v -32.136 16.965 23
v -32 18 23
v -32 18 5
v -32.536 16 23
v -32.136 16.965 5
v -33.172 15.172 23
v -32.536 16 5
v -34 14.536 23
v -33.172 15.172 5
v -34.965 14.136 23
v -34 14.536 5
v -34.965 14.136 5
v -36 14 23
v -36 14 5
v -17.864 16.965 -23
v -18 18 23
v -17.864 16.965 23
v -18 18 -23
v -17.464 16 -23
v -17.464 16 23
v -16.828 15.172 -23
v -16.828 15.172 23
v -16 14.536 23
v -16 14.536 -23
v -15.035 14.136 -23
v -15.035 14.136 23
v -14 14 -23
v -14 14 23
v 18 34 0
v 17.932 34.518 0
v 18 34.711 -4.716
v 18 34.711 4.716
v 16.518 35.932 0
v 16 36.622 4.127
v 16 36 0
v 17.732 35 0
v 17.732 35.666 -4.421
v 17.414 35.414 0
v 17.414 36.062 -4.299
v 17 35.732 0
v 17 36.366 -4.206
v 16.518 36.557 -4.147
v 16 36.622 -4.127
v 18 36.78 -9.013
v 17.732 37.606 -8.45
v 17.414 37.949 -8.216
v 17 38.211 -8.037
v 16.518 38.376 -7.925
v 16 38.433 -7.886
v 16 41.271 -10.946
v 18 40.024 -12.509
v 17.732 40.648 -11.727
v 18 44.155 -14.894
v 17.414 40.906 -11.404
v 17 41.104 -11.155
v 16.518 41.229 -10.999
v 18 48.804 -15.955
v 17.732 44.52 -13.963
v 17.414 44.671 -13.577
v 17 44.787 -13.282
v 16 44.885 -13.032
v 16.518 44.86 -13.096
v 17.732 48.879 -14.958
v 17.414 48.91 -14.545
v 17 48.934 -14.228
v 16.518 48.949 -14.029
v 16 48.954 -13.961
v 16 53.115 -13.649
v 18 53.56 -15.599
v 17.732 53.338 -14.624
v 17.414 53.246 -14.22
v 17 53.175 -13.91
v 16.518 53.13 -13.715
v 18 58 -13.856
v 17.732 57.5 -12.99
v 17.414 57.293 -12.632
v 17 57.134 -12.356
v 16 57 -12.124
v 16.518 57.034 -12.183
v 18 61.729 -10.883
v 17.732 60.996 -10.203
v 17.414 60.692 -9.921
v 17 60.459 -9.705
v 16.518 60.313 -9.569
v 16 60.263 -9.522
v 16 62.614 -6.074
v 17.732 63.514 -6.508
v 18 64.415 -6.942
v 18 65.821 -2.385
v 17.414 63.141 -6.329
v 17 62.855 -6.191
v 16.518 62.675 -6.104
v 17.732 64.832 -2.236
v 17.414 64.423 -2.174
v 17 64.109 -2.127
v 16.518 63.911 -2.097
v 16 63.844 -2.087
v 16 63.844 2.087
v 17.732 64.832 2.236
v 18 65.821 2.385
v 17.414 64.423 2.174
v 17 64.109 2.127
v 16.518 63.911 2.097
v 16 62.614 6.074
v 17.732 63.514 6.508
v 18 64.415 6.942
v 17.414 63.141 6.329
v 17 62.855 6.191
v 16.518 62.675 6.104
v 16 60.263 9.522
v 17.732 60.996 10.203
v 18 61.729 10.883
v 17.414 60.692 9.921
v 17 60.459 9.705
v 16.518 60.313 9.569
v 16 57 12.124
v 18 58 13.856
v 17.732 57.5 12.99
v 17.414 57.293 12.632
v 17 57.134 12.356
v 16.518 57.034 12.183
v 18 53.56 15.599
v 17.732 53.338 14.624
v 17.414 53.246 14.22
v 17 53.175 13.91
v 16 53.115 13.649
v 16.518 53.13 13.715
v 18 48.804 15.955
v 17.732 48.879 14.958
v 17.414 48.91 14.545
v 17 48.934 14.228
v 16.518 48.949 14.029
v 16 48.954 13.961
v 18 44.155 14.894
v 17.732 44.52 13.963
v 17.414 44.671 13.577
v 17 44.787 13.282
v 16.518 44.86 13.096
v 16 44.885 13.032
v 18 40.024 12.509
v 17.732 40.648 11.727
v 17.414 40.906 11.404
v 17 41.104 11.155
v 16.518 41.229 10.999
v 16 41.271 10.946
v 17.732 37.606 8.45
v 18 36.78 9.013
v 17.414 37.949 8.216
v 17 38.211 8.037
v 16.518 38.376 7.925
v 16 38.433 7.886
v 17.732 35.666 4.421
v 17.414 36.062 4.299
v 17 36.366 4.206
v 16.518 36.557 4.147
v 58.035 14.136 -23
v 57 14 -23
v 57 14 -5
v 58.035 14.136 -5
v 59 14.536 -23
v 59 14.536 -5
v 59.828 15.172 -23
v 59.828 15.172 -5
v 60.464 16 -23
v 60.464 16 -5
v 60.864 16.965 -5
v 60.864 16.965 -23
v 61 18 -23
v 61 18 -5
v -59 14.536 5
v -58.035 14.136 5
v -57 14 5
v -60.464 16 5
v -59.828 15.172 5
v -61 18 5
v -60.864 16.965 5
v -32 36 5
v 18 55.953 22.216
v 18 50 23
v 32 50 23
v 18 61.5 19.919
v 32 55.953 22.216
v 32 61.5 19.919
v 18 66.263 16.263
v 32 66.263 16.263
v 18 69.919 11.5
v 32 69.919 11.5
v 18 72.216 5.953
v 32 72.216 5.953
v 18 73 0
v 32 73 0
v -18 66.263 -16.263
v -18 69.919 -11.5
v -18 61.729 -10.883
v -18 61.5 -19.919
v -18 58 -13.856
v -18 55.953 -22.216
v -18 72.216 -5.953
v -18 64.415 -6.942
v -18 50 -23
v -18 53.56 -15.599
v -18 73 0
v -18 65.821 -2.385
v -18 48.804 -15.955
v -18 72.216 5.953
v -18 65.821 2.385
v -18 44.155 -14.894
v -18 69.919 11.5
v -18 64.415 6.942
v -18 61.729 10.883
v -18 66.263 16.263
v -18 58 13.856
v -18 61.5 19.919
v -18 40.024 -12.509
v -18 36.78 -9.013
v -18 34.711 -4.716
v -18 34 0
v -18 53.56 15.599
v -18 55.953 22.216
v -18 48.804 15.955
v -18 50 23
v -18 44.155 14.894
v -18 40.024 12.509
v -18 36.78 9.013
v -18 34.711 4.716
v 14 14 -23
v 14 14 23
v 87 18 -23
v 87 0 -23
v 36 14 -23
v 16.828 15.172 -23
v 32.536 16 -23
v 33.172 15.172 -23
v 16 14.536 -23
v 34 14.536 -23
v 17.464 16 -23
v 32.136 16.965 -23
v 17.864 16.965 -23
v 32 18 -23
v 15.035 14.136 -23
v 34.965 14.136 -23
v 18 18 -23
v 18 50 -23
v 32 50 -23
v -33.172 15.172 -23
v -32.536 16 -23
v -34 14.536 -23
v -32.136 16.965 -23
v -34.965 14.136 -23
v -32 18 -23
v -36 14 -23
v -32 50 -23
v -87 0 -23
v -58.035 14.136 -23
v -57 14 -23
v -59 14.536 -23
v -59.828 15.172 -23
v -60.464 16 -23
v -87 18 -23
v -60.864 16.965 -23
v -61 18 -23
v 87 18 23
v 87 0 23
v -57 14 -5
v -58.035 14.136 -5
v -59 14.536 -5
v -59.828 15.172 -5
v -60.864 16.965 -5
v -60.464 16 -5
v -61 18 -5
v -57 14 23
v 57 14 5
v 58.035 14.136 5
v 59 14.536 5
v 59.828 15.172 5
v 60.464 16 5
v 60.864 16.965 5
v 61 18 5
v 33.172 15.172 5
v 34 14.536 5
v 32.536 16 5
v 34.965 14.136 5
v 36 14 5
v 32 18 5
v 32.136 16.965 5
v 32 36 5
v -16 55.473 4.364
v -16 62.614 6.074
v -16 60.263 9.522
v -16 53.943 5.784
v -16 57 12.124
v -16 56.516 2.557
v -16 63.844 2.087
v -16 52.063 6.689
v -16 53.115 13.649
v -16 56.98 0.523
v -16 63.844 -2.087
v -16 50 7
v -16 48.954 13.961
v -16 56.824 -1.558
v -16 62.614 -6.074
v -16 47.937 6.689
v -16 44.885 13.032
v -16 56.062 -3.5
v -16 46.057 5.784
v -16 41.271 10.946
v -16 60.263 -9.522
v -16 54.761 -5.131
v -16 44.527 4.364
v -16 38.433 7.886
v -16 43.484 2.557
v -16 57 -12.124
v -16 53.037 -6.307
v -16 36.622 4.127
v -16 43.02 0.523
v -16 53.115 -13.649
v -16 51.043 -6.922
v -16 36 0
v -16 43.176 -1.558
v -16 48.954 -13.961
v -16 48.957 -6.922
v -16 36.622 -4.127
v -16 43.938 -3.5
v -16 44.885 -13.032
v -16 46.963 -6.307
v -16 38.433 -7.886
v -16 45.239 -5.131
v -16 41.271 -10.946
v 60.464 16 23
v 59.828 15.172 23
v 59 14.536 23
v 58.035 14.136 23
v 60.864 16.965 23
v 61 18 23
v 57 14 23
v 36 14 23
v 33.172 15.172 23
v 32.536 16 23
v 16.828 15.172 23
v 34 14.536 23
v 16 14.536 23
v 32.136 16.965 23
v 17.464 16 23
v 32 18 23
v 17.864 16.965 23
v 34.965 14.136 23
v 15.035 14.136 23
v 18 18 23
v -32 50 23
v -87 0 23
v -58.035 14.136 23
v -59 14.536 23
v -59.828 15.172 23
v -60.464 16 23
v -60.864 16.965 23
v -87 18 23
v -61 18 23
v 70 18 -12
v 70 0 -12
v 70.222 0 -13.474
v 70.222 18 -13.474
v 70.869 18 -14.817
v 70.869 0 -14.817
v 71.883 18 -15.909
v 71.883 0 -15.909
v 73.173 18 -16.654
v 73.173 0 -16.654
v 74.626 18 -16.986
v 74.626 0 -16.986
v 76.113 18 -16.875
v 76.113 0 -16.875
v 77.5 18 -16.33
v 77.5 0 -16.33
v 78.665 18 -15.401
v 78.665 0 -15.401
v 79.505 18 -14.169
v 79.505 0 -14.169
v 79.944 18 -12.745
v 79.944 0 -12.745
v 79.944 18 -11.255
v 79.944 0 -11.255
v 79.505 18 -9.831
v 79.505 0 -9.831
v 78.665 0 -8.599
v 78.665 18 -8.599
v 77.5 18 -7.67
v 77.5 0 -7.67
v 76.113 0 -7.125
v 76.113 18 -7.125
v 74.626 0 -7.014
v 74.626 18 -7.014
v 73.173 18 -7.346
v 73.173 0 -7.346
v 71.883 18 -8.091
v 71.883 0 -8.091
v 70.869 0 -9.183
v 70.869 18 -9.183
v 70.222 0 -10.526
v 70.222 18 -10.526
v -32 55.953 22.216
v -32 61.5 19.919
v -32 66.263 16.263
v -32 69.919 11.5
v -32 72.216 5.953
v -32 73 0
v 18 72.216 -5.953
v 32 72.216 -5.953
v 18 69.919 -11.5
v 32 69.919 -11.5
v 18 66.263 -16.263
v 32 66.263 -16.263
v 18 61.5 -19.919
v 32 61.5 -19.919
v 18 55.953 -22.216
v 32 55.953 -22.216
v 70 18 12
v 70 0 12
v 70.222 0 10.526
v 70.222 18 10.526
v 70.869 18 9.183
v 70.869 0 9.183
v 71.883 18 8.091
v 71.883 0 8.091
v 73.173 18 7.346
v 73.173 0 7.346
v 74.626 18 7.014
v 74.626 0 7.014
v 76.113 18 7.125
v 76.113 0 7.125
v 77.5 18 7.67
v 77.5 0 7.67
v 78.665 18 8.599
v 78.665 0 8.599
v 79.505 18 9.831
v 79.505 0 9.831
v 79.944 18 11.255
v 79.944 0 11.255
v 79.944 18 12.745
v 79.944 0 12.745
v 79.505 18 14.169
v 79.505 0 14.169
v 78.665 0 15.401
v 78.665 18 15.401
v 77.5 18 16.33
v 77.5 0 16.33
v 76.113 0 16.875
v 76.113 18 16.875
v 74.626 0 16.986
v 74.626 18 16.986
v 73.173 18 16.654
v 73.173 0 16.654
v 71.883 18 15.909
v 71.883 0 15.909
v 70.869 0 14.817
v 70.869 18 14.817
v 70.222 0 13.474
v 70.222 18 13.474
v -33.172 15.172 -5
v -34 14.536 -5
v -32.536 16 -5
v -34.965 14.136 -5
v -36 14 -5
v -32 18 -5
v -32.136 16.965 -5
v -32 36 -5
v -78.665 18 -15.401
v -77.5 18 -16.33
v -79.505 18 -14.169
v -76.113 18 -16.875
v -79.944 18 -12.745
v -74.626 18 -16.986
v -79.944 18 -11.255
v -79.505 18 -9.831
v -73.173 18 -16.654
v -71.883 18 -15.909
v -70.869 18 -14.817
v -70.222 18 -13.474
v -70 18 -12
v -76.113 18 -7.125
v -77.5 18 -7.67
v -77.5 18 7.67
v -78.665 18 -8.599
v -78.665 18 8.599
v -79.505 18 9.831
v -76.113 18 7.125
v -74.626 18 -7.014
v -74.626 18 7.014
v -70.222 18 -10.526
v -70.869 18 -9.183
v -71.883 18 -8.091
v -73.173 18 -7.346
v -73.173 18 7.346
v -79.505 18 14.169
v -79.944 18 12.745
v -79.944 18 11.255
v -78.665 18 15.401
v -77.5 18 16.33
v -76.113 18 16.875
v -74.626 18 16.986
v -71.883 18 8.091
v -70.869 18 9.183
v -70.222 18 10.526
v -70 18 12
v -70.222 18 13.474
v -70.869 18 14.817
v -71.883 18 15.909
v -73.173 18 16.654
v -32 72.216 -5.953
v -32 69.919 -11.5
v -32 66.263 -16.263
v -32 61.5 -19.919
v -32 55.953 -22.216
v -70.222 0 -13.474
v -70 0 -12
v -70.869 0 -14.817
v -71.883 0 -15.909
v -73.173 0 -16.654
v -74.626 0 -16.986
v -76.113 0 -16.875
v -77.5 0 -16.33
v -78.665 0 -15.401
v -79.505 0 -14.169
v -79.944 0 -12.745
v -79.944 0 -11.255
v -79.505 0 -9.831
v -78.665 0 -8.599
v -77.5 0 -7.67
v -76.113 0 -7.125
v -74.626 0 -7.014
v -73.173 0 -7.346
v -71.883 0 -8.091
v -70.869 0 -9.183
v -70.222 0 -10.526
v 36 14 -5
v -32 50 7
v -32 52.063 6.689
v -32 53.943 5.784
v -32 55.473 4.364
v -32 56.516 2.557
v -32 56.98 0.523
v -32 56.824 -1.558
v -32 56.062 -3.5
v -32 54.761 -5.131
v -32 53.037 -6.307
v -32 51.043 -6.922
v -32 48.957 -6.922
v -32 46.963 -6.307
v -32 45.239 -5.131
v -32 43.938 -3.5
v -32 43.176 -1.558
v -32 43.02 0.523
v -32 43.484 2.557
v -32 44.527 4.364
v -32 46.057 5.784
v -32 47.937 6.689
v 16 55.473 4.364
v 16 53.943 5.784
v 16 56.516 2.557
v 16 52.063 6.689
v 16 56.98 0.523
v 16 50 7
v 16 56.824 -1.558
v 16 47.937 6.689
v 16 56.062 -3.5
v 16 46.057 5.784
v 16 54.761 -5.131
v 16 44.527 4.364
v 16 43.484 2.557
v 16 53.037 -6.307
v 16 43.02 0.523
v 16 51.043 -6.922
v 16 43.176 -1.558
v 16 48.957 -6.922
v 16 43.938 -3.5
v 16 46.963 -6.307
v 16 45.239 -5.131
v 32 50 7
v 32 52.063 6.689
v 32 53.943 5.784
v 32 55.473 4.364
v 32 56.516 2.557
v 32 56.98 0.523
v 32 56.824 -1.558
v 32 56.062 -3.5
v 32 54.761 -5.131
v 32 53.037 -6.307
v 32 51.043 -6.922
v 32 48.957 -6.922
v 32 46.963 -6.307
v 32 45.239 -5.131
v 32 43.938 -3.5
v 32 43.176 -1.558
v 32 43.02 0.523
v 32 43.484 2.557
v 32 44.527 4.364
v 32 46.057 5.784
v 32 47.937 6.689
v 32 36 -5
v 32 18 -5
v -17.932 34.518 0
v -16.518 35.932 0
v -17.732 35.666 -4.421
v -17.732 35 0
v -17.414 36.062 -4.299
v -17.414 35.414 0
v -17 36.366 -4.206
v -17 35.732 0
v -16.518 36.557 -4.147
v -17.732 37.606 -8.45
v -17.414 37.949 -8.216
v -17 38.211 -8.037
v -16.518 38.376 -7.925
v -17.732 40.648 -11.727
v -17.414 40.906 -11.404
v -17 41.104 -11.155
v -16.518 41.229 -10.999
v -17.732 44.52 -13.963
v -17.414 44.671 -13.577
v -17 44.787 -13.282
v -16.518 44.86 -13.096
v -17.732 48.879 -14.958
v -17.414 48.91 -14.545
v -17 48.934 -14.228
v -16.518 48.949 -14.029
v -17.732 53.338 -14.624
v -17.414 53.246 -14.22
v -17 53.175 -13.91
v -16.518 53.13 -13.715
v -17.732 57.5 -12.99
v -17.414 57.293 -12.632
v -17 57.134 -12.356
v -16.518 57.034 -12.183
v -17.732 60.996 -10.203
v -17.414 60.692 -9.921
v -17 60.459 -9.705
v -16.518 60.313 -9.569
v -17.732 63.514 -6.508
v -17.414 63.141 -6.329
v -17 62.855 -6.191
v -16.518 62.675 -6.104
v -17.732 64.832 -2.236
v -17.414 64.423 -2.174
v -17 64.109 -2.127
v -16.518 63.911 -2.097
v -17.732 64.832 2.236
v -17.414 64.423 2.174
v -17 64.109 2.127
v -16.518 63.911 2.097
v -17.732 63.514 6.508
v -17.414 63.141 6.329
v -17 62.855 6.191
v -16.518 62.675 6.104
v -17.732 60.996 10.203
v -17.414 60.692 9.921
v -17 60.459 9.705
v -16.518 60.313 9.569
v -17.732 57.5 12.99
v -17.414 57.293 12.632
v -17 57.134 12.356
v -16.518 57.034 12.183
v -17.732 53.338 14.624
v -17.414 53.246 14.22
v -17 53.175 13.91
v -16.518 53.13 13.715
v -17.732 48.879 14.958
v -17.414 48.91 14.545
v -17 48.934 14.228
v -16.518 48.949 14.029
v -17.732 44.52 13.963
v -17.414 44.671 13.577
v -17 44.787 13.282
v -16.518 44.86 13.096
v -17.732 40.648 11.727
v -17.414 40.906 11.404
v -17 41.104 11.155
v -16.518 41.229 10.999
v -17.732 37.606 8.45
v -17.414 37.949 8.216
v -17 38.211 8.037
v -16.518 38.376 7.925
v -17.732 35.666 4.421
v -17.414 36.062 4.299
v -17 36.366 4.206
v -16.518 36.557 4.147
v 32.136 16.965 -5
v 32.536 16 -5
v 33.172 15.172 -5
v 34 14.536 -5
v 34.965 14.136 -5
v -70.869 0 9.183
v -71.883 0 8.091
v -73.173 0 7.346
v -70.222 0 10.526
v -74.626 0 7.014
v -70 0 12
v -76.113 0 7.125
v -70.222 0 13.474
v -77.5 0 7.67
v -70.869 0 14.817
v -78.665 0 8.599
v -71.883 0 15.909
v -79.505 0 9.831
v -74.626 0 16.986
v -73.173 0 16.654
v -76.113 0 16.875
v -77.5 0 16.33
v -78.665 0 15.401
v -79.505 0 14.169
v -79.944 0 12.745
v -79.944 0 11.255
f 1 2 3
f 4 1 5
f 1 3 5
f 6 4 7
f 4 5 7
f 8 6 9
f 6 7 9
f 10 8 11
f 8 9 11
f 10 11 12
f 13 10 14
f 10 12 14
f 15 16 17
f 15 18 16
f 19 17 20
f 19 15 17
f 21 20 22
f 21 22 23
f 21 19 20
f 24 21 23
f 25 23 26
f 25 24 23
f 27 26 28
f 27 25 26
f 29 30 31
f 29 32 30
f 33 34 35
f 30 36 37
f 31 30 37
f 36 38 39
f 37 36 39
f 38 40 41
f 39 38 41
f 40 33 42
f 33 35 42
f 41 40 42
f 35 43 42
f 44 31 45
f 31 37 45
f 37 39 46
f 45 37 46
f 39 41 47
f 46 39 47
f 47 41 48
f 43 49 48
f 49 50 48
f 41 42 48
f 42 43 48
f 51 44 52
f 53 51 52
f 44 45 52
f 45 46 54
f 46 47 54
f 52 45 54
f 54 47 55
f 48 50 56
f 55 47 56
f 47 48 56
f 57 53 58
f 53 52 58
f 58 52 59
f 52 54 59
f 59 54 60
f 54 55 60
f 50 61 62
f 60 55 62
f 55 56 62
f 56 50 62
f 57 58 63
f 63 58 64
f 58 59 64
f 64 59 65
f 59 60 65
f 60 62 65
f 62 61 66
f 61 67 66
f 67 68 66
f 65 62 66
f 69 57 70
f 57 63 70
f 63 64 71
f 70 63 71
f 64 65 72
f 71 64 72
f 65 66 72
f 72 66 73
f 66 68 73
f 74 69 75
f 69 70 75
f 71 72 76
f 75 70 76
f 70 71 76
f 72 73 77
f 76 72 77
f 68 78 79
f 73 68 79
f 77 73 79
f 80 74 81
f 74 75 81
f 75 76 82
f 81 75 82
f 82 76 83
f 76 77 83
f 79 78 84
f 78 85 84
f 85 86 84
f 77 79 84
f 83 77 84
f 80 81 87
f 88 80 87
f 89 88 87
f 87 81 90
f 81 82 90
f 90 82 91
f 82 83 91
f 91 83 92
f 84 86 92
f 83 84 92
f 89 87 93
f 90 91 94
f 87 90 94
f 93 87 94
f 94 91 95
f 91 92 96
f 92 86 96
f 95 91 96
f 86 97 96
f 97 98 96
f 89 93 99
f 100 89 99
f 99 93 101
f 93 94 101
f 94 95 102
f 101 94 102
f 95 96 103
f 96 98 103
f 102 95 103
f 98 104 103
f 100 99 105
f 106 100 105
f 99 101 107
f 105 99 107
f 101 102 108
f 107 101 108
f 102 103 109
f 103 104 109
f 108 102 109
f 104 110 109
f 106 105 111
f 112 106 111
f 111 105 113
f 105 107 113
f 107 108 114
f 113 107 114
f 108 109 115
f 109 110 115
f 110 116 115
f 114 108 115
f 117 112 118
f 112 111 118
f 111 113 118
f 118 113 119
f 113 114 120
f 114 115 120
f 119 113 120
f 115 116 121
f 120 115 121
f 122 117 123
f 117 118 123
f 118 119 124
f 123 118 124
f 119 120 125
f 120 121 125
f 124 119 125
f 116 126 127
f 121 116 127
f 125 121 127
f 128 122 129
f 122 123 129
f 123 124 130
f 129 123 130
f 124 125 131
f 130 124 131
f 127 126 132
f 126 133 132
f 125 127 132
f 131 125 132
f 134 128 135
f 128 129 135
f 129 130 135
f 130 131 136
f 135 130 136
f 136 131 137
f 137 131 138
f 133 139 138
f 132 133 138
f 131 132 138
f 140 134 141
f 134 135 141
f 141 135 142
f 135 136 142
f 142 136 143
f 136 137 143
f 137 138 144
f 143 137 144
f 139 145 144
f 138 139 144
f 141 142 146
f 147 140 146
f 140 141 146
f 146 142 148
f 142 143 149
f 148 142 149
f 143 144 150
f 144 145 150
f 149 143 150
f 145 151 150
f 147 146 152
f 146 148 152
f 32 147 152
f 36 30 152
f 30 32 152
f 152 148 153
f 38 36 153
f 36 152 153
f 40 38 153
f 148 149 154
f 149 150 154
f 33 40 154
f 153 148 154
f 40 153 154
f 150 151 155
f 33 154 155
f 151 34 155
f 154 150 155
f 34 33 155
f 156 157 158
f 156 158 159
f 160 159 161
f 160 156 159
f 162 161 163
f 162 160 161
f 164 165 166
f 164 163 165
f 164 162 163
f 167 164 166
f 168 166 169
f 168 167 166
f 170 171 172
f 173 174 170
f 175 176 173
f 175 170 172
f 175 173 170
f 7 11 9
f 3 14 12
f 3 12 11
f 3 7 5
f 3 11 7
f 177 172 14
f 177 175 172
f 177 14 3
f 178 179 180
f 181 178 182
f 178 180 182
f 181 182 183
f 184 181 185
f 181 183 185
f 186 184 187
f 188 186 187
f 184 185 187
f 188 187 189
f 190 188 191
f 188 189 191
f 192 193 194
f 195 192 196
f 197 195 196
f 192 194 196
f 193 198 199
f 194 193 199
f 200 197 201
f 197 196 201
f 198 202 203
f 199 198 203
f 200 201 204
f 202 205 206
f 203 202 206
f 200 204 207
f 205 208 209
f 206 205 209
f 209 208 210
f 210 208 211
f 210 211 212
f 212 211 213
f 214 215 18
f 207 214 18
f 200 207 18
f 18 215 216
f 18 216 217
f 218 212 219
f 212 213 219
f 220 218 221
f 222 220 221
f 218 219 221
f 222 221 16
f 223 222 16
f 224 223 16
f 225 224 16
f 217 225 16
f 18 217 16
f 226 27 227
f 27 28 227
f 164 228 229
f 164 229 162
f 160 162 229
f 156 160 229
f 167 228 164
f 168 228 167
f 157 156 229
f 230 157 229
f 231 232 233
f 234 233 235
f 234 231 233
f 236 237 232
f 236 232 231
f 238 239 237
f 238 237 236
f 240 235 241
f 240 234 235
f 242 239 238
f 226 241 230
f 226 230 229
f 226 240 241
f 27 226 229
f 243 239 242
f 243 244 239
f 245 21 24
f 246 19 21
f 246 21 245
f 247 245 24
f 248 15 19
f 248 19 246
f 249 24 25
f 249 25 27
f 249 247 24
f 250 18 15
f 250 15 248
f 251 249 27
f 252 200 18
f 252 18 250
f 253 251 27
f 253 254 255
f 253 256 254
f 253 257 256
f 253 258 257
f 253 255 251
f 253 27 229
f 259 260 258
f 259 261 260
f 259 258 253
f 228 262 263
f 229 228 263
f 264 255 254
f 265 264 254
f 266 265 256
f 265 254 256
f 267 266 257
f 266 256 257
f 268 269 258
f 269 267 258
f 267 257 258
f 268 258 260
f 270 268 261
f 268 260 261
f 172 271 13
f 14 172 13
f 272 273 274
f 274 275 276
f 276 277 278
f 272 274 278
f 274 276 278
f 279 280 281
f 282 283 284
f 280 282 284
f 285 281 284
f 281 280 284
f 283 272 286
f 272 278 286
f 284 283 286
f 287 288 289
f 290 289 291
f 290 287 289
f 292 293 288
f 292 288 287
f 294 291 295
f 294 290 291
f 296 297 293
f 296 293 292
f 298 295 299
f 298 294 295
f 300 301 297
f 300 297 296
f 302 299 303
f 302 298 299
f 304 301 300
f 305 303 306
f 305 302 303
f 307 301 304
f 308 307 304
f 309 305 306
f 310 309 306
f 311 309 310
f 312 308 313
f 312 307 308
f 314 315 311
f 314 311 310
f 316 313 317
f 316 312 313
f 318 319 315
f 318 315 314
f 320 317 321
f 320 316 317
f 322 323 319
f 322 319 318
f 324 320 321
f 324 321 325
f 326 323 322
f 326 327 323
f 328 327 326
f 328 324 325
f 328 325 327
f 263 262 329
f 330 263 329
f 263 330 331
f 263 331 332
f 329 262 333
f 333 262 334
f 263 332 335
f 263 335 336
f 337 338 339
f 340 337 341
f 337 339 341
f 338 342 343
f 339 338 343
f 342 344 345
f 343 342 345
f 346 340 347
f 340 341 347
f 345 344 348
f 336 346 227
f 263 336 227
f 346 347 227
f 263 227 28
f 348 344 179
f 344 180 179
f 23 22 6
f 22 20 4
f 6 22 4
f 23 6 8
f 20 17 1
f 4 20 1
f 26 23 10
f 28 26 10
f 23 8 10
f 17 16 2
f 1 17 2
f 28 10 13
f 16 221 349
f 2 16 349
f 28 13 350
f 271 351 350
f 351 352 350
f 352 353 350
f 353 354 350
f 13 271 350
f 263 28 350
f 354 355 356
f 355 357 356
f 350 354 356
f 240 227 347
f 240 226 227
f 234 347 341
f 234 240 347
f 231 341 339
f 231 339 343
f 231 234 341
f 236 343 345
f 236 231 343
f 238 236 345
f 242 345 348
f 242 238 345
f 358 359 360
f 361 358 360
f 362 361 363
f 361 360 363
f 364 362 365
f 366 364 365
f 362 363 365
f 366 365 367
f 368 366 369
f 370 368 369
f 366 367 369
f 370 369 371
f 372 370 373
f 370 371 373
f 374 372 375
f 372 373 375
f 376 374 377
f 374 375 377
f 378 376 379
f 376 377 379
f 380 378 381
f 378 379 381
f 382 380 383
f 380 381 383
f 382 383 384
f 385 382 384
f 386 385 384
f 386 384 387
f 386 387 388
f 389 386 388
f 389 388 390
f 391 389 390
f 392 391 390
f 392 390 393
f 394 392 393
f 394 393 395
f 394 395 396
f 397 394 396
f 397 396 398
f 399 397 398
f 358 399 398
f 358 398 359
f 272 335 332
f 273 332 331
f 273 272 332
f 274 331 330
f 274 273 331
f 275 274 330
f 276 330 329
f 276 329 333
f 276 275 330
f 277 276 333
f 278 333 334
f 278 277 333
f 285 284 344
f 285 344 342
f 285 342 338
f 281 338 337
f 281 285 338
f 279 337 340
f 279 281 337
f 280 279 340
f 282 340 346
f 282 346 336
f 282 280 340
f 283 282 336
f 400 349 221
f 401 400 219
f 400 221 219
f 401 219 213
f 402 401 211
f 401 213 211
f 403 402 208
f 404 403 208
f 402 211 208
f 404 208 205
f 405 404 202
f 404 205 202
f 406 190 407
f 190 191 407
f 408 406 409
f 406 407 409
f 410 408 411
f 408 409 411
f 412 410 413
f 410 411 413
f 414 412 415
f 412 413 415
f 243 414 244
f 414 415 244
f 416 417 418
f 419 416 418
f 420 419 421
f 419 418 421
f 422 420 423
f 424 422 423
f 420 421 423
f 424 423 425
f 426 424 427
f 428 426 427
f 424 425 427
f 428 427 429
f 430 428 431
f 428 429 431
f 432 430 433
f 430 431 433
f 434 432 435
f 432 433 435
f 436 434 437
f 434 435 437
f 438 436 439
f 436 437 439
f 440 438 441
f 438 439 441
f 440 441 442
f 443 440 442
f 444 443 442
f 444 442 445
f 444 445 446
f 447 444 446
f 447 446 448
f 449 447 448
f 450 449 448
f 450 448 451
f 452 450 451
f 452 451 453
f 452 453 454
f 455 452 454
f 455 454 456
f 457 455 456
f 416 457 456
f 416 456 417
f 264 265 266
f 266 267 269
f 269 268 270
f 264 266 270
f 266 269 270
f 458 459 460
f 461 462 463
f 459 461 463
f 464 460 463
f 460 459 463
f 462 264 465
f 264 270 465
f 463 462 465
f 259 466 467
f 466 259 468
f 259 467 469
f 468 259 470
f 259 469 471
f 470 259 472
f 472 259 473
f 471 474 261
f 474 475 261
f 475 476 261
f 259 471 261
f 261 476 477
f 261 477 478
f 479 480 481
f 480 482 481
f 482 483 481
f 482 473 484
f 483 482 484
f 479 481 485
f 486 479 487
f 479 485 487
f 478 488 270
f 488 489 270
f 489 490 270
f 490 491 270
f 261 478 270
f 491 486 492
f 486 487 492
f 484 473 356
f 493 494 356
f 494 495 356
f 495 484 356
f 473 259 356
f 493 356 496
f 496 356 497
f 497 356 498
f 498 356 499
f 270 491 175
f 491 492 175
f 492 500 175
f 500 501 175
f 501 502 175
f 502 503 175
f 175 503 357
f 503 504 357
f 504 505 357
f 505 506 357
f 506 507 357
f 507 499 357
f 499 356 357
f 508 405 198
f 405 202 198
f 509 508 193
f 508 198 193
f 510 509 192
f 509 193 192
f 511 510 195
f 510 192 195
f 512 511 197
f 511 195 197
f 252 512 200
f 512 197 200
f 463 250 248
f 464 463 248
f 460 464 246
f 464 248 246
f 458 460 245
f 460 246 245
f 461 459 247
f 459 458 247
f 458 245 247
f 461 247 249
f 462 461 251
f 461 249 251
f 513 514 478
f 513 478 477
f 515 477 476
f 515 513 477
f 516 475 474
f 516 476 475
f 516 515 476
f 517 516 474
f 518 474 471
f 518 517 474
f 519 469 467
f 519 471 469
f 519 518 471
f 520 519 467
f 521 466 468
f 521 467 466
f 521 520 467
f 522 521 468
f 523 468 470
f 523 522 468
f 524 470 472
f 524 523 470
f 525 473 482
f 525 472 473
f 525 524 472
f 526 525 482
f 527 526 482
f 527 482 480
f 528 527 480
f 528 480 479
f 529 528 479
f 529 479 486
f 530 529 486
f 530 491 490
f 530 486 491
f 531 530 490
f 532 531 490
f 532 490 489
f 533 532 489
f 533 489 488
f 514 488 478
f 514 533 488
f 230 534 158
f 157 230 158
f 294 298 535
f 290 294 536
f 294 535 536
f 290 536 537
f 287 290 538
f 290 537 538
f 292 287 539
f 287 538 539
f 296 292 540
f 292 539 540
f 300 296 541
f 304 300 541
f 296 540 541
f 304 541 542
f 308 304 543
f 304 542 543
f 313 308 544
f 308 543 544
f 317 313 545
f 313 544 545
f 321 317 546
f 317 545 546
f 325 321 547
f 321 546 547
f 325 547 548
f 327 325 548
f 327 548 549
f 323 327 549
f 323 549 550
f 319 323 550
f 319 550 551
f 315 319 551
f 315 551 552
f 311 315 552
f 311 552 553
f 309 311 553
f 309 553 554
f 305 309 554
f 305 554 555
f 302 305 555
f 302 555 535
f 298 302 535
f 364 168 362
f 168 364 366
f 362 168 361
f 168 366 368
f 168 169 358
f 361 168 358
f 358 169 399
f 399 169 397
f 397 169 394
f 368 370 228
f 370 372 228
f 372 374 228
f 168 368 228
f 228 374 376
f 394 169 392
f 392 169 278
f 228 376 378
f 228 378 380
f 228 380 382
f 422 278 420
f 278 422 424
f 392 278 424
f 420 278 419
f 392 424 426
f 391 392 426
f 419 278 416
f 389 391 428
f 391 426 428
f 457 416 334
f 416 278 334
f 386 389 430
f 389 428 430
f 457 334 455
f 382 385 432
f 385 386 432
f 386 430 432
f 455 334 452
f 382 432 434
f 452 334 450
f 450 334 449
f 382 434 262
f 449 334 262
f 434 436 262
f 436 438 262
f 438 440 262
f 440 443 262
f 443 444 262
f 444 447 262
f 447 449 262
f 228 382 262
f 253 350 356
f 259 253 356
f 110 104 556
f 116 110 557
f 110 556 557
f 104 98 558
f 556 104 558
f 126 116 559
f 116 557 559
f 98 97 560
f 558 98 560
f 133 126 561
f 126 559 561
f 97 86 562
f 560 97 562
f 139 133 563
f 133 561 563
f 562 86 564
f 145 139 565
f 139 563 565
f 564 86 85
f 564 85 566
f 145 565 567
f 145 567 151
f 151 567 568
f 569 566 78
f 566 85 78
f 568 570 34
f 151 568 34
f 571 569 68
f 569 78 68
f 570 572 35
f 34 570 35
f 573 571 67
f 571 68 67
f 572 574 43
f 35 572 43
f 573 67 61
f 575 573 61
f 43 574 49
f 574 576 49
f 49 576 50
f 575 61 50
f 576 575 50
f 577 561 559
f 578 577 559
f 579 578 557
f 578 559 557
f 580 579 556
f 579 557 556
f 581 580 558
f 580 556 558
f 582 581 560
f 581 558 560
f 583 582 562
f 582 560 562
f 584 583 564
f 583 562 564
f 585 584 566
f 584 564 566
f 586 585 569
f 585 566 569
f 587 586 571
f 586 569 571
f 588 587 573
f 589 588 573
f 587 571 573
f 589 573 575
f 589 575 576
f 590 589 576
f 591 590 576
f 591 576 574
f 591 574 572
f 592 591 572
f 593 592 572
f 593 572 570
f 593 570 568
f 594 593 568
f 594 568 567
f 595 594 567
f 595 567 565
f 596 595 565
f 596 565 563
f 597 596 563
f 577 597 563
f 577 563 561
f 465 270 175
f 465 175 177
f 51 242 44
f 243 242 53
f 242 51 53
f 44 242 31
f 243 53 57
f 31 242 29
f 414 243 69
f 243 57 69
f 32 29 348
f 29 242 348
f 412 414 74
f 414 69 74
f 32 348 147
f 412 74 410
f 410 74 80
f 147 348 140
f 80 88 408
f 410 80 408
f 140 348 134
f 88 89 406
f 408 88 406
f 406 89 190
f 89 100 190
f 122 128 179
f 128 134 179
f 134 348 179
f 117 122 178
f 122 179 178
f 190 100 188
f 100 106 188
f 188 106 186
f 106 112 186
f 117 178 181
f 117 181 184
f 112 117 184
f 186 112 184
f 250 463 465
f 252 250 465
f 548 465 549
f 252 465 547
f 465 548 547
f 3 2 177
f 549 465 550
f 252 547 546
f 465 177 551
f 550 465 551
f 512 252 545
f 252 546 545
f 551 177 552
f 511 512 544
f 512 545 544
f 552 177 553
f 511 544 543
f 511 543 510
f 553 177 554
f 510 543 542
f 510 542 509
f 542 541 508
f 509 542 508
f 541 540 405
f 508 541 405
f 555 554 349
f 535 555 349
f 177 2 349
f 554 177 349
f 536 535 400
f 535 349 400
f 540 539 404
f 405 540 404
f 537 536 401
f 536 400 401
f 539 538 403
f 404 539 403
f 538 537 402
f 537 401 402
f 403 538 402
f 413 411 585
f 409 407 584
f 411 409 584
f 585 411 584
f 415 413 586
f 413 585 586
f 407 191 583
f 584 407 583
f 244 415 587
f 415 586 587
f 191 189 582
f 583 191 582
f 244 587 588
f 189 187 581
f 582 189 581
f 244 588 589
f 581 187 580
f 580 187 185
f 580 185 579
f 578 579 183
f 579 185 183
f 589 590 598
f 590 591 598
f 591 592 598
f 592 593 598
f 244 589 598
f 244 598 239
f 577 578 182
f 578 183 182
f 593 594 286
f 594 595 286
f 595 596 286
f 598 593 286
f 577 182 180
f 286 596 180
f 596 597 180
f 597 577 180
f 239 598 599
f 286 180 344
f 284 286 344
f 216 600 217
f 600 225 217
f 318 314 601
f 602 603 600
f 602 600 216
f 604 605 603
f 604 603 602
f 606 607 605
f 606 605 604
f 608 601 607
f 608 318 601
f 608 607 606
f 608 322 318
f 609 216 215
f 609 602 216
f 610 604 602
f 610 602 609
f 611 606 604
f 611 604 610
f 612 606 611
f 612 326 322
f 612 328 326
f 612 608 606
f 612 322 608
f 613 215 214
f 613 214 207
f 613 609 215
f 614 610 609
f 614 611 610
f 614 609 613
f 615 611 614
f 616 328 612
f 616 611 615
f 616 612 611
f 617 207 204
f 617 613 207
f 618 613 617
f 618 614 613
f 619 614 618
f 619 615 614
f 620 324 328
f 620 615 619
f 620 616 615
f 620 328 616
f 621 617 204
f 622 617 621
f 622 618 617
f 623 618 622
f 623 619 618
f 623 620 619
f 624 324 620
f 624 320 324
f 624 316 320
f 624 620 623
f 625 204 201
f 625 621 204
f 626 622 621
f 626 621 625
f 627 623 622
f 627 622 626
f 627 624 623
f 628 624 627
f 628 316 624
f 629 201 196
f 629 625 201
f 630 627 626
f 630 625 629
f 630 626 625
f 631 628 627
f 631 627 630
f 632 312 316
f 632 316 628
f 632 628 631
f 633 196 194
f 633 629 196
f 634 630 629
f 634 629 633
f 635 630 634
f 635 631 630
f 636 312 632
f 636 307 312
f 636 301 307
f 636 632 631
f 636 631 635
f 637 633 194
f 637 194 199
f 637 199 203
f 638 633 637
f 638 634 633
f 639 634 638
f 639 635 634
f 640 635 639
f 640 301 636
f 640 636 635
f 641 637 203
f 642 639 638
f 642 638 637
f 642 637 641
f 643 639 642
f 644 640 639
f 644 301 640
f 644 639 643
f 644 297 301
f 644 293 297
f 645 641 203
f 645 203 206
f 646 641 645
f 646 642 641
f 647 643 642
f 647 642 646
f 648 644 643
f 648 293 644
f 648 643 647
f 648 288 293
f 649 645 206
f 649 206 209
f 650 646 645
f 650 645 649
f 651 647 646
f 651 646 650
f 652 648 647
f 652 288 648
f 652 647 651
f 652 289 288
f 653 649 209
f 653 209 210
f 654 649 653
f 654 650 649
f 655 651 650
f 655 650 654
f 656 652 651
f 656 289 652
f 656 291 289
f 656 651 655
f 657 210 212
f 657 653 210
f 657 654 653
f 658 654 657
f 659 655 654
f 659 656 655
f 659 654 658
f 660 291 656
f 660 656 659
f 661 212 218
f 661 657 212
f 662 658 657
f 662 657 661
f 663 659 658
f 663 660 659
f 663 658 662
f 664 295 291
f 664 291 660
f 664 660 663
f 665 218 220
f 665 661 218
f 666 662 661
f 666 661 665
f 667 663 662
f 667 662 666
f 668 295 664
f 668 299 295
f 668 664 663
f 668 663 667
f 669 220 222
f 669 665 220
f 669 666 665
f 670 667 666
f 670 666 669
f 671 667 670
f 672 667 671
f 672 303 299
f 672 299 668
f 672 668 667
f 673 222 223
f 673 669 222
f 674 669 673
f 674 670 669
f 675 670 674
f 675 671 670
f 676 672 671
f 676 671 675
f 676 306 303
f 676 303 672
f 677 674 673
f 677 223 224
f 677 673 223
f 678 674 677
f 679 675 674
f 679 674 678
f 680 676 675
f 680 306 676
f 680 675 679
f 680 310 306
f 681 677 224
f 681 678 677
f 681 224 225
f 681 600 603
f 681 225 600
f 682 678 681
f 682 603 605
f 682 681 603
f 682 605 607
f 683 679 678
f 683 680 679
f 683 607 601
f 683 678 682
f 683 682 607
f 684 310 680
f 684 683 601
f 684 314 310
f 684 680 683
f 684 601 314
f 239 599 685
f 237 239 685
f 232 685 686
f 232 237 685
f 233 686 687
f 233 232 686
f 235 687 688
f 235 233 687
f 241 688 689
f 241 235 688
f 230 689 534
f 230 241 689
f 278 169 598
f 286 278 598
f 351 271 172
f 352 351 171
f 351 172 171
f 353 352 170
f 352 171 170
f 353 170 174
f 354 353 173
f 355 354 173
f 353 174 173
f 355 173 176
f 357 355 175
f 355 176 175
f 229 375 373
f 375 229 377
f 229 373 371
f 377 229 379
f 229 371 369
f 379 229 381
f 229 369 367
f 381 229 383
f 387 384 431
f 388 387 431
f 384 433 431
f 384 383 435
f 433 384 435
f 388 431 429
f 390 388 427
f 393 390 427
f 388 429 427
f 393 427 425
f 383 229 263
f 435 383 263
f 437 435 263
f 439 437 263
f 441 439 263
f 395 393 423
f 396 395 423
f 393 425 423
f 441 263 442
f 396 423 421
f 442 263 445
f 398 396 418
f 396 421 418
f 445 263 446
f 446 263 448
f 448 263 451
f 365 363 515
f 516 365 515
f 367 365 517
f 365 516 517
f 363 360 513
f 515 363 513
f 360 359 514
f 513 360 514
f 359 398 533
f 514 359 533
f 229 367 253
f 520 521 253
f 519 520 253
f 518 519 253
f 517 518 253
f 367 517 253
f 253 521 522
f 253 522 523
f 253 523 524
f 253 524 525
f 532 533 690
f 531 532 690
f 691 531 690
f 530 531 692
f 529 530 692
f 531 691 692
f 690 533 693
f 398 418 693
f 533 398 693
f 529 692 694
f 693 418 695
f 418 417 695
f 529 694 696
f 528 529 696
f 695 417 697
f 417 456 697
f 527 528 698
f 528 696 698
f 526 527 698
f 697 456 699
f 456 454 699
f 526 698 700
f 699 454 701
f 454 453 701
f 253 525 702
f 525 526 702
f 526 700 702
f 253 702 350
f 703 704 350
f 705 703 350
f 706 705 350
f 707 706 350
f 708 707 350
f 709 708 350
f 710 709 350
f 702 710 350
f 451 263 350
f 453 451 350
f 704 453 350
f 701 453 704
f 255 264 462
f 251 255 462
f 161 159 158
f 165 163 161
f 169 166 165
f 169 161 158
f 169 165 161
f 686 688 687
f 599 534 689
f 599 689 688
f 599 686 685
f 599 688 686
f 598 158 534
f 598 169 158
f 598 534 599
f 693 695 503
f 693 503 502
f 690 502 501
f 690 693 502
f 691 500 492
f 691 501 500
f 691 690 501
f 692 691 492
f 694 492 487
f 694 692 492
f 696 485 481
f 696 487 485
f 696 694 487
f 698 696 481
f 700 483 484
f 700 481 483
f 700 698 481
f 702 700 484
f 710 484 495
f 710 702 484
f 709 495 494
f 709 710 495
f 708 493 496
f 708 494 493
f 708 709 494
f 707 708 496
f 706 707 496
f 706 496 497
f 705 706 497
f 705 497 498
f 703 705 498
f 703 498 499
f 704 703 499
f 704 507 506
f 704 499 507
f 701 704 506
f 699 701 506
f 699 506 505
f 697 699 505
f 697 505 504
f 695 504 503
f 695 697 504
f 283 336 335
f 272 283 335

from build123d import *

# Parameters (mm, degrees)
BOSS_EXTRUDE1_DEPTH = 23
FILLET1_R           = 23
SKETCH2_R           = 14
BOSS_EXTRUDE2_DEPTH = 2
HOLE1_D             = 14
FILLET2_R           = 2
FILLET3_R           = 4
RIB1_REACH          = 117.875
SKETCH5_WALL_W      = 267.881961488
SKETCH5_WALL_H      = 10
HOLE2_D             = 10


with BuildPart() as part:
    # Sketch1 → Boss-Extrude1 (new, symmetric)
    with BuildSketch(Plane.XY):
        Polygon((-87, 0), (-87, 18), (-61, 18), (-61, 14), (-32, 14), (-32, 73), (-18, 73), (-18, 14), (18, 14), (18, 73), (32, 73), (32, 14), (61, 14), (61, 18), (87, 18), (87, 0), align=None)
    extrude(amount=BOSS_EXTRUDE1_DEPTH, both=True)

    # Fillet1
    fillet1_edges = [part.edges().sort_by_distance(p)[0] for p in [
        (-25, 73, 23),
        (-25, 73, -23),
        (25, 73, -23),
        (25, 73, 23),
    ]]
    fillet(fillet1_edges, radius=FILLET1_R - 0.0001)  # a hair under: the kernel refuses the full size

    # Sketch2 → Boss-Extrude2 (add)
    with BuildSketch(Plane(origin=(-18, 0, 0), x_dir=(0, 0, -1), z_dir=(1, 0, 0))):
        with Locations(Location((0, 50, 0), (0, 0, 270))):
            Circle(SKETCH2_R)
    boss_extrude2 = extrude(amount=BOSS_EXTRUDE2_DEPTH)

    # Mirror1: Boss-Extrude2 across plane
    add(boss_extrude2.mirror(Plane(origin=(0, 0, 0), x_dir=(0, 0, 1), z_dir=(1, 0, 0))))

    # Hole1 (through all)
    with Locations(Plane(origin=(32, 0, 0), x_dir=(0, 0, -1), z_dir=(1, 0, 0))):
        with Locations((0, 50)):
            Hole(HOLE1_D / 2)

    # Fillet2
    fillet2_edges = [part.edges().sort_by_distance(p)[0] for p in [
        (-18, 64, 0),
        (18, 64, 0),
    ]]
    fillet(fillet2_edges, radius=FILLET2_R - 0.0001)  # a hair under: the kernel refuses the full size

    # Fillet3
    fillet3_edges = [part.edges().sort_by_distance(p)[0] for p in [
        (-32, 14, 0),
        (18, 14, 0),
        (61, 14, 0),
        (32, 14, 0),
        (-18, 14, 0),
        (-61, 14, 0),
    ]]
    fillet(fillet3_edges, radius=FILLET3_R - 0.0001)  # a hair under: the kernel refuses the full size

    # Sketch5 wall → Rib1 (add, up to next)
    with BuildSketch(Plane(origin=(46.5, 27, 0), x_dir=(-0.849640166198, 0.527362861778, 0), z_dir=(-0.527362861778, -0.849640166198, 0)), mode=Mode.PRIVATE) as rib1_sk1:
        Rectangle(SKETCH5_WALL_W, SKETCH5_WALL_H)
    rib1_tool1 = extrude(rib1_sk1.sketch, amount=RIB1_REACH, mode=Mode.PRIVATE) - part.part
    rib1 = rib1_tool1.solids().sort_by_distance((46.5, 27, 0))[0]
    add(rib1)

    # Mirror2: Rib1 across plane
    add(rib1.mirror(Plane(origin=(0, 0, 0), x_dir=(0, 0, 1), z_dir=(1, 0, 0))))

    # Hole2 (through all)
    with Locations(Plane(origin=(0, 18, 0), x_dir=(1, 0, 0), z_dir=(0, 1, 0))):
        with Locations((75, 12), (75, -12)):
            hole2 = Hole(HOLE2_D / 2)

    # Mirror3: Hole2 across plane
    add(hole2.mirror(Plane(origin=(0, 0, 0), x_dir=(0, 0, 1), z_dir=(1, 0, 0))), mode=Mode.SUBTRACT)


solid = part.part
